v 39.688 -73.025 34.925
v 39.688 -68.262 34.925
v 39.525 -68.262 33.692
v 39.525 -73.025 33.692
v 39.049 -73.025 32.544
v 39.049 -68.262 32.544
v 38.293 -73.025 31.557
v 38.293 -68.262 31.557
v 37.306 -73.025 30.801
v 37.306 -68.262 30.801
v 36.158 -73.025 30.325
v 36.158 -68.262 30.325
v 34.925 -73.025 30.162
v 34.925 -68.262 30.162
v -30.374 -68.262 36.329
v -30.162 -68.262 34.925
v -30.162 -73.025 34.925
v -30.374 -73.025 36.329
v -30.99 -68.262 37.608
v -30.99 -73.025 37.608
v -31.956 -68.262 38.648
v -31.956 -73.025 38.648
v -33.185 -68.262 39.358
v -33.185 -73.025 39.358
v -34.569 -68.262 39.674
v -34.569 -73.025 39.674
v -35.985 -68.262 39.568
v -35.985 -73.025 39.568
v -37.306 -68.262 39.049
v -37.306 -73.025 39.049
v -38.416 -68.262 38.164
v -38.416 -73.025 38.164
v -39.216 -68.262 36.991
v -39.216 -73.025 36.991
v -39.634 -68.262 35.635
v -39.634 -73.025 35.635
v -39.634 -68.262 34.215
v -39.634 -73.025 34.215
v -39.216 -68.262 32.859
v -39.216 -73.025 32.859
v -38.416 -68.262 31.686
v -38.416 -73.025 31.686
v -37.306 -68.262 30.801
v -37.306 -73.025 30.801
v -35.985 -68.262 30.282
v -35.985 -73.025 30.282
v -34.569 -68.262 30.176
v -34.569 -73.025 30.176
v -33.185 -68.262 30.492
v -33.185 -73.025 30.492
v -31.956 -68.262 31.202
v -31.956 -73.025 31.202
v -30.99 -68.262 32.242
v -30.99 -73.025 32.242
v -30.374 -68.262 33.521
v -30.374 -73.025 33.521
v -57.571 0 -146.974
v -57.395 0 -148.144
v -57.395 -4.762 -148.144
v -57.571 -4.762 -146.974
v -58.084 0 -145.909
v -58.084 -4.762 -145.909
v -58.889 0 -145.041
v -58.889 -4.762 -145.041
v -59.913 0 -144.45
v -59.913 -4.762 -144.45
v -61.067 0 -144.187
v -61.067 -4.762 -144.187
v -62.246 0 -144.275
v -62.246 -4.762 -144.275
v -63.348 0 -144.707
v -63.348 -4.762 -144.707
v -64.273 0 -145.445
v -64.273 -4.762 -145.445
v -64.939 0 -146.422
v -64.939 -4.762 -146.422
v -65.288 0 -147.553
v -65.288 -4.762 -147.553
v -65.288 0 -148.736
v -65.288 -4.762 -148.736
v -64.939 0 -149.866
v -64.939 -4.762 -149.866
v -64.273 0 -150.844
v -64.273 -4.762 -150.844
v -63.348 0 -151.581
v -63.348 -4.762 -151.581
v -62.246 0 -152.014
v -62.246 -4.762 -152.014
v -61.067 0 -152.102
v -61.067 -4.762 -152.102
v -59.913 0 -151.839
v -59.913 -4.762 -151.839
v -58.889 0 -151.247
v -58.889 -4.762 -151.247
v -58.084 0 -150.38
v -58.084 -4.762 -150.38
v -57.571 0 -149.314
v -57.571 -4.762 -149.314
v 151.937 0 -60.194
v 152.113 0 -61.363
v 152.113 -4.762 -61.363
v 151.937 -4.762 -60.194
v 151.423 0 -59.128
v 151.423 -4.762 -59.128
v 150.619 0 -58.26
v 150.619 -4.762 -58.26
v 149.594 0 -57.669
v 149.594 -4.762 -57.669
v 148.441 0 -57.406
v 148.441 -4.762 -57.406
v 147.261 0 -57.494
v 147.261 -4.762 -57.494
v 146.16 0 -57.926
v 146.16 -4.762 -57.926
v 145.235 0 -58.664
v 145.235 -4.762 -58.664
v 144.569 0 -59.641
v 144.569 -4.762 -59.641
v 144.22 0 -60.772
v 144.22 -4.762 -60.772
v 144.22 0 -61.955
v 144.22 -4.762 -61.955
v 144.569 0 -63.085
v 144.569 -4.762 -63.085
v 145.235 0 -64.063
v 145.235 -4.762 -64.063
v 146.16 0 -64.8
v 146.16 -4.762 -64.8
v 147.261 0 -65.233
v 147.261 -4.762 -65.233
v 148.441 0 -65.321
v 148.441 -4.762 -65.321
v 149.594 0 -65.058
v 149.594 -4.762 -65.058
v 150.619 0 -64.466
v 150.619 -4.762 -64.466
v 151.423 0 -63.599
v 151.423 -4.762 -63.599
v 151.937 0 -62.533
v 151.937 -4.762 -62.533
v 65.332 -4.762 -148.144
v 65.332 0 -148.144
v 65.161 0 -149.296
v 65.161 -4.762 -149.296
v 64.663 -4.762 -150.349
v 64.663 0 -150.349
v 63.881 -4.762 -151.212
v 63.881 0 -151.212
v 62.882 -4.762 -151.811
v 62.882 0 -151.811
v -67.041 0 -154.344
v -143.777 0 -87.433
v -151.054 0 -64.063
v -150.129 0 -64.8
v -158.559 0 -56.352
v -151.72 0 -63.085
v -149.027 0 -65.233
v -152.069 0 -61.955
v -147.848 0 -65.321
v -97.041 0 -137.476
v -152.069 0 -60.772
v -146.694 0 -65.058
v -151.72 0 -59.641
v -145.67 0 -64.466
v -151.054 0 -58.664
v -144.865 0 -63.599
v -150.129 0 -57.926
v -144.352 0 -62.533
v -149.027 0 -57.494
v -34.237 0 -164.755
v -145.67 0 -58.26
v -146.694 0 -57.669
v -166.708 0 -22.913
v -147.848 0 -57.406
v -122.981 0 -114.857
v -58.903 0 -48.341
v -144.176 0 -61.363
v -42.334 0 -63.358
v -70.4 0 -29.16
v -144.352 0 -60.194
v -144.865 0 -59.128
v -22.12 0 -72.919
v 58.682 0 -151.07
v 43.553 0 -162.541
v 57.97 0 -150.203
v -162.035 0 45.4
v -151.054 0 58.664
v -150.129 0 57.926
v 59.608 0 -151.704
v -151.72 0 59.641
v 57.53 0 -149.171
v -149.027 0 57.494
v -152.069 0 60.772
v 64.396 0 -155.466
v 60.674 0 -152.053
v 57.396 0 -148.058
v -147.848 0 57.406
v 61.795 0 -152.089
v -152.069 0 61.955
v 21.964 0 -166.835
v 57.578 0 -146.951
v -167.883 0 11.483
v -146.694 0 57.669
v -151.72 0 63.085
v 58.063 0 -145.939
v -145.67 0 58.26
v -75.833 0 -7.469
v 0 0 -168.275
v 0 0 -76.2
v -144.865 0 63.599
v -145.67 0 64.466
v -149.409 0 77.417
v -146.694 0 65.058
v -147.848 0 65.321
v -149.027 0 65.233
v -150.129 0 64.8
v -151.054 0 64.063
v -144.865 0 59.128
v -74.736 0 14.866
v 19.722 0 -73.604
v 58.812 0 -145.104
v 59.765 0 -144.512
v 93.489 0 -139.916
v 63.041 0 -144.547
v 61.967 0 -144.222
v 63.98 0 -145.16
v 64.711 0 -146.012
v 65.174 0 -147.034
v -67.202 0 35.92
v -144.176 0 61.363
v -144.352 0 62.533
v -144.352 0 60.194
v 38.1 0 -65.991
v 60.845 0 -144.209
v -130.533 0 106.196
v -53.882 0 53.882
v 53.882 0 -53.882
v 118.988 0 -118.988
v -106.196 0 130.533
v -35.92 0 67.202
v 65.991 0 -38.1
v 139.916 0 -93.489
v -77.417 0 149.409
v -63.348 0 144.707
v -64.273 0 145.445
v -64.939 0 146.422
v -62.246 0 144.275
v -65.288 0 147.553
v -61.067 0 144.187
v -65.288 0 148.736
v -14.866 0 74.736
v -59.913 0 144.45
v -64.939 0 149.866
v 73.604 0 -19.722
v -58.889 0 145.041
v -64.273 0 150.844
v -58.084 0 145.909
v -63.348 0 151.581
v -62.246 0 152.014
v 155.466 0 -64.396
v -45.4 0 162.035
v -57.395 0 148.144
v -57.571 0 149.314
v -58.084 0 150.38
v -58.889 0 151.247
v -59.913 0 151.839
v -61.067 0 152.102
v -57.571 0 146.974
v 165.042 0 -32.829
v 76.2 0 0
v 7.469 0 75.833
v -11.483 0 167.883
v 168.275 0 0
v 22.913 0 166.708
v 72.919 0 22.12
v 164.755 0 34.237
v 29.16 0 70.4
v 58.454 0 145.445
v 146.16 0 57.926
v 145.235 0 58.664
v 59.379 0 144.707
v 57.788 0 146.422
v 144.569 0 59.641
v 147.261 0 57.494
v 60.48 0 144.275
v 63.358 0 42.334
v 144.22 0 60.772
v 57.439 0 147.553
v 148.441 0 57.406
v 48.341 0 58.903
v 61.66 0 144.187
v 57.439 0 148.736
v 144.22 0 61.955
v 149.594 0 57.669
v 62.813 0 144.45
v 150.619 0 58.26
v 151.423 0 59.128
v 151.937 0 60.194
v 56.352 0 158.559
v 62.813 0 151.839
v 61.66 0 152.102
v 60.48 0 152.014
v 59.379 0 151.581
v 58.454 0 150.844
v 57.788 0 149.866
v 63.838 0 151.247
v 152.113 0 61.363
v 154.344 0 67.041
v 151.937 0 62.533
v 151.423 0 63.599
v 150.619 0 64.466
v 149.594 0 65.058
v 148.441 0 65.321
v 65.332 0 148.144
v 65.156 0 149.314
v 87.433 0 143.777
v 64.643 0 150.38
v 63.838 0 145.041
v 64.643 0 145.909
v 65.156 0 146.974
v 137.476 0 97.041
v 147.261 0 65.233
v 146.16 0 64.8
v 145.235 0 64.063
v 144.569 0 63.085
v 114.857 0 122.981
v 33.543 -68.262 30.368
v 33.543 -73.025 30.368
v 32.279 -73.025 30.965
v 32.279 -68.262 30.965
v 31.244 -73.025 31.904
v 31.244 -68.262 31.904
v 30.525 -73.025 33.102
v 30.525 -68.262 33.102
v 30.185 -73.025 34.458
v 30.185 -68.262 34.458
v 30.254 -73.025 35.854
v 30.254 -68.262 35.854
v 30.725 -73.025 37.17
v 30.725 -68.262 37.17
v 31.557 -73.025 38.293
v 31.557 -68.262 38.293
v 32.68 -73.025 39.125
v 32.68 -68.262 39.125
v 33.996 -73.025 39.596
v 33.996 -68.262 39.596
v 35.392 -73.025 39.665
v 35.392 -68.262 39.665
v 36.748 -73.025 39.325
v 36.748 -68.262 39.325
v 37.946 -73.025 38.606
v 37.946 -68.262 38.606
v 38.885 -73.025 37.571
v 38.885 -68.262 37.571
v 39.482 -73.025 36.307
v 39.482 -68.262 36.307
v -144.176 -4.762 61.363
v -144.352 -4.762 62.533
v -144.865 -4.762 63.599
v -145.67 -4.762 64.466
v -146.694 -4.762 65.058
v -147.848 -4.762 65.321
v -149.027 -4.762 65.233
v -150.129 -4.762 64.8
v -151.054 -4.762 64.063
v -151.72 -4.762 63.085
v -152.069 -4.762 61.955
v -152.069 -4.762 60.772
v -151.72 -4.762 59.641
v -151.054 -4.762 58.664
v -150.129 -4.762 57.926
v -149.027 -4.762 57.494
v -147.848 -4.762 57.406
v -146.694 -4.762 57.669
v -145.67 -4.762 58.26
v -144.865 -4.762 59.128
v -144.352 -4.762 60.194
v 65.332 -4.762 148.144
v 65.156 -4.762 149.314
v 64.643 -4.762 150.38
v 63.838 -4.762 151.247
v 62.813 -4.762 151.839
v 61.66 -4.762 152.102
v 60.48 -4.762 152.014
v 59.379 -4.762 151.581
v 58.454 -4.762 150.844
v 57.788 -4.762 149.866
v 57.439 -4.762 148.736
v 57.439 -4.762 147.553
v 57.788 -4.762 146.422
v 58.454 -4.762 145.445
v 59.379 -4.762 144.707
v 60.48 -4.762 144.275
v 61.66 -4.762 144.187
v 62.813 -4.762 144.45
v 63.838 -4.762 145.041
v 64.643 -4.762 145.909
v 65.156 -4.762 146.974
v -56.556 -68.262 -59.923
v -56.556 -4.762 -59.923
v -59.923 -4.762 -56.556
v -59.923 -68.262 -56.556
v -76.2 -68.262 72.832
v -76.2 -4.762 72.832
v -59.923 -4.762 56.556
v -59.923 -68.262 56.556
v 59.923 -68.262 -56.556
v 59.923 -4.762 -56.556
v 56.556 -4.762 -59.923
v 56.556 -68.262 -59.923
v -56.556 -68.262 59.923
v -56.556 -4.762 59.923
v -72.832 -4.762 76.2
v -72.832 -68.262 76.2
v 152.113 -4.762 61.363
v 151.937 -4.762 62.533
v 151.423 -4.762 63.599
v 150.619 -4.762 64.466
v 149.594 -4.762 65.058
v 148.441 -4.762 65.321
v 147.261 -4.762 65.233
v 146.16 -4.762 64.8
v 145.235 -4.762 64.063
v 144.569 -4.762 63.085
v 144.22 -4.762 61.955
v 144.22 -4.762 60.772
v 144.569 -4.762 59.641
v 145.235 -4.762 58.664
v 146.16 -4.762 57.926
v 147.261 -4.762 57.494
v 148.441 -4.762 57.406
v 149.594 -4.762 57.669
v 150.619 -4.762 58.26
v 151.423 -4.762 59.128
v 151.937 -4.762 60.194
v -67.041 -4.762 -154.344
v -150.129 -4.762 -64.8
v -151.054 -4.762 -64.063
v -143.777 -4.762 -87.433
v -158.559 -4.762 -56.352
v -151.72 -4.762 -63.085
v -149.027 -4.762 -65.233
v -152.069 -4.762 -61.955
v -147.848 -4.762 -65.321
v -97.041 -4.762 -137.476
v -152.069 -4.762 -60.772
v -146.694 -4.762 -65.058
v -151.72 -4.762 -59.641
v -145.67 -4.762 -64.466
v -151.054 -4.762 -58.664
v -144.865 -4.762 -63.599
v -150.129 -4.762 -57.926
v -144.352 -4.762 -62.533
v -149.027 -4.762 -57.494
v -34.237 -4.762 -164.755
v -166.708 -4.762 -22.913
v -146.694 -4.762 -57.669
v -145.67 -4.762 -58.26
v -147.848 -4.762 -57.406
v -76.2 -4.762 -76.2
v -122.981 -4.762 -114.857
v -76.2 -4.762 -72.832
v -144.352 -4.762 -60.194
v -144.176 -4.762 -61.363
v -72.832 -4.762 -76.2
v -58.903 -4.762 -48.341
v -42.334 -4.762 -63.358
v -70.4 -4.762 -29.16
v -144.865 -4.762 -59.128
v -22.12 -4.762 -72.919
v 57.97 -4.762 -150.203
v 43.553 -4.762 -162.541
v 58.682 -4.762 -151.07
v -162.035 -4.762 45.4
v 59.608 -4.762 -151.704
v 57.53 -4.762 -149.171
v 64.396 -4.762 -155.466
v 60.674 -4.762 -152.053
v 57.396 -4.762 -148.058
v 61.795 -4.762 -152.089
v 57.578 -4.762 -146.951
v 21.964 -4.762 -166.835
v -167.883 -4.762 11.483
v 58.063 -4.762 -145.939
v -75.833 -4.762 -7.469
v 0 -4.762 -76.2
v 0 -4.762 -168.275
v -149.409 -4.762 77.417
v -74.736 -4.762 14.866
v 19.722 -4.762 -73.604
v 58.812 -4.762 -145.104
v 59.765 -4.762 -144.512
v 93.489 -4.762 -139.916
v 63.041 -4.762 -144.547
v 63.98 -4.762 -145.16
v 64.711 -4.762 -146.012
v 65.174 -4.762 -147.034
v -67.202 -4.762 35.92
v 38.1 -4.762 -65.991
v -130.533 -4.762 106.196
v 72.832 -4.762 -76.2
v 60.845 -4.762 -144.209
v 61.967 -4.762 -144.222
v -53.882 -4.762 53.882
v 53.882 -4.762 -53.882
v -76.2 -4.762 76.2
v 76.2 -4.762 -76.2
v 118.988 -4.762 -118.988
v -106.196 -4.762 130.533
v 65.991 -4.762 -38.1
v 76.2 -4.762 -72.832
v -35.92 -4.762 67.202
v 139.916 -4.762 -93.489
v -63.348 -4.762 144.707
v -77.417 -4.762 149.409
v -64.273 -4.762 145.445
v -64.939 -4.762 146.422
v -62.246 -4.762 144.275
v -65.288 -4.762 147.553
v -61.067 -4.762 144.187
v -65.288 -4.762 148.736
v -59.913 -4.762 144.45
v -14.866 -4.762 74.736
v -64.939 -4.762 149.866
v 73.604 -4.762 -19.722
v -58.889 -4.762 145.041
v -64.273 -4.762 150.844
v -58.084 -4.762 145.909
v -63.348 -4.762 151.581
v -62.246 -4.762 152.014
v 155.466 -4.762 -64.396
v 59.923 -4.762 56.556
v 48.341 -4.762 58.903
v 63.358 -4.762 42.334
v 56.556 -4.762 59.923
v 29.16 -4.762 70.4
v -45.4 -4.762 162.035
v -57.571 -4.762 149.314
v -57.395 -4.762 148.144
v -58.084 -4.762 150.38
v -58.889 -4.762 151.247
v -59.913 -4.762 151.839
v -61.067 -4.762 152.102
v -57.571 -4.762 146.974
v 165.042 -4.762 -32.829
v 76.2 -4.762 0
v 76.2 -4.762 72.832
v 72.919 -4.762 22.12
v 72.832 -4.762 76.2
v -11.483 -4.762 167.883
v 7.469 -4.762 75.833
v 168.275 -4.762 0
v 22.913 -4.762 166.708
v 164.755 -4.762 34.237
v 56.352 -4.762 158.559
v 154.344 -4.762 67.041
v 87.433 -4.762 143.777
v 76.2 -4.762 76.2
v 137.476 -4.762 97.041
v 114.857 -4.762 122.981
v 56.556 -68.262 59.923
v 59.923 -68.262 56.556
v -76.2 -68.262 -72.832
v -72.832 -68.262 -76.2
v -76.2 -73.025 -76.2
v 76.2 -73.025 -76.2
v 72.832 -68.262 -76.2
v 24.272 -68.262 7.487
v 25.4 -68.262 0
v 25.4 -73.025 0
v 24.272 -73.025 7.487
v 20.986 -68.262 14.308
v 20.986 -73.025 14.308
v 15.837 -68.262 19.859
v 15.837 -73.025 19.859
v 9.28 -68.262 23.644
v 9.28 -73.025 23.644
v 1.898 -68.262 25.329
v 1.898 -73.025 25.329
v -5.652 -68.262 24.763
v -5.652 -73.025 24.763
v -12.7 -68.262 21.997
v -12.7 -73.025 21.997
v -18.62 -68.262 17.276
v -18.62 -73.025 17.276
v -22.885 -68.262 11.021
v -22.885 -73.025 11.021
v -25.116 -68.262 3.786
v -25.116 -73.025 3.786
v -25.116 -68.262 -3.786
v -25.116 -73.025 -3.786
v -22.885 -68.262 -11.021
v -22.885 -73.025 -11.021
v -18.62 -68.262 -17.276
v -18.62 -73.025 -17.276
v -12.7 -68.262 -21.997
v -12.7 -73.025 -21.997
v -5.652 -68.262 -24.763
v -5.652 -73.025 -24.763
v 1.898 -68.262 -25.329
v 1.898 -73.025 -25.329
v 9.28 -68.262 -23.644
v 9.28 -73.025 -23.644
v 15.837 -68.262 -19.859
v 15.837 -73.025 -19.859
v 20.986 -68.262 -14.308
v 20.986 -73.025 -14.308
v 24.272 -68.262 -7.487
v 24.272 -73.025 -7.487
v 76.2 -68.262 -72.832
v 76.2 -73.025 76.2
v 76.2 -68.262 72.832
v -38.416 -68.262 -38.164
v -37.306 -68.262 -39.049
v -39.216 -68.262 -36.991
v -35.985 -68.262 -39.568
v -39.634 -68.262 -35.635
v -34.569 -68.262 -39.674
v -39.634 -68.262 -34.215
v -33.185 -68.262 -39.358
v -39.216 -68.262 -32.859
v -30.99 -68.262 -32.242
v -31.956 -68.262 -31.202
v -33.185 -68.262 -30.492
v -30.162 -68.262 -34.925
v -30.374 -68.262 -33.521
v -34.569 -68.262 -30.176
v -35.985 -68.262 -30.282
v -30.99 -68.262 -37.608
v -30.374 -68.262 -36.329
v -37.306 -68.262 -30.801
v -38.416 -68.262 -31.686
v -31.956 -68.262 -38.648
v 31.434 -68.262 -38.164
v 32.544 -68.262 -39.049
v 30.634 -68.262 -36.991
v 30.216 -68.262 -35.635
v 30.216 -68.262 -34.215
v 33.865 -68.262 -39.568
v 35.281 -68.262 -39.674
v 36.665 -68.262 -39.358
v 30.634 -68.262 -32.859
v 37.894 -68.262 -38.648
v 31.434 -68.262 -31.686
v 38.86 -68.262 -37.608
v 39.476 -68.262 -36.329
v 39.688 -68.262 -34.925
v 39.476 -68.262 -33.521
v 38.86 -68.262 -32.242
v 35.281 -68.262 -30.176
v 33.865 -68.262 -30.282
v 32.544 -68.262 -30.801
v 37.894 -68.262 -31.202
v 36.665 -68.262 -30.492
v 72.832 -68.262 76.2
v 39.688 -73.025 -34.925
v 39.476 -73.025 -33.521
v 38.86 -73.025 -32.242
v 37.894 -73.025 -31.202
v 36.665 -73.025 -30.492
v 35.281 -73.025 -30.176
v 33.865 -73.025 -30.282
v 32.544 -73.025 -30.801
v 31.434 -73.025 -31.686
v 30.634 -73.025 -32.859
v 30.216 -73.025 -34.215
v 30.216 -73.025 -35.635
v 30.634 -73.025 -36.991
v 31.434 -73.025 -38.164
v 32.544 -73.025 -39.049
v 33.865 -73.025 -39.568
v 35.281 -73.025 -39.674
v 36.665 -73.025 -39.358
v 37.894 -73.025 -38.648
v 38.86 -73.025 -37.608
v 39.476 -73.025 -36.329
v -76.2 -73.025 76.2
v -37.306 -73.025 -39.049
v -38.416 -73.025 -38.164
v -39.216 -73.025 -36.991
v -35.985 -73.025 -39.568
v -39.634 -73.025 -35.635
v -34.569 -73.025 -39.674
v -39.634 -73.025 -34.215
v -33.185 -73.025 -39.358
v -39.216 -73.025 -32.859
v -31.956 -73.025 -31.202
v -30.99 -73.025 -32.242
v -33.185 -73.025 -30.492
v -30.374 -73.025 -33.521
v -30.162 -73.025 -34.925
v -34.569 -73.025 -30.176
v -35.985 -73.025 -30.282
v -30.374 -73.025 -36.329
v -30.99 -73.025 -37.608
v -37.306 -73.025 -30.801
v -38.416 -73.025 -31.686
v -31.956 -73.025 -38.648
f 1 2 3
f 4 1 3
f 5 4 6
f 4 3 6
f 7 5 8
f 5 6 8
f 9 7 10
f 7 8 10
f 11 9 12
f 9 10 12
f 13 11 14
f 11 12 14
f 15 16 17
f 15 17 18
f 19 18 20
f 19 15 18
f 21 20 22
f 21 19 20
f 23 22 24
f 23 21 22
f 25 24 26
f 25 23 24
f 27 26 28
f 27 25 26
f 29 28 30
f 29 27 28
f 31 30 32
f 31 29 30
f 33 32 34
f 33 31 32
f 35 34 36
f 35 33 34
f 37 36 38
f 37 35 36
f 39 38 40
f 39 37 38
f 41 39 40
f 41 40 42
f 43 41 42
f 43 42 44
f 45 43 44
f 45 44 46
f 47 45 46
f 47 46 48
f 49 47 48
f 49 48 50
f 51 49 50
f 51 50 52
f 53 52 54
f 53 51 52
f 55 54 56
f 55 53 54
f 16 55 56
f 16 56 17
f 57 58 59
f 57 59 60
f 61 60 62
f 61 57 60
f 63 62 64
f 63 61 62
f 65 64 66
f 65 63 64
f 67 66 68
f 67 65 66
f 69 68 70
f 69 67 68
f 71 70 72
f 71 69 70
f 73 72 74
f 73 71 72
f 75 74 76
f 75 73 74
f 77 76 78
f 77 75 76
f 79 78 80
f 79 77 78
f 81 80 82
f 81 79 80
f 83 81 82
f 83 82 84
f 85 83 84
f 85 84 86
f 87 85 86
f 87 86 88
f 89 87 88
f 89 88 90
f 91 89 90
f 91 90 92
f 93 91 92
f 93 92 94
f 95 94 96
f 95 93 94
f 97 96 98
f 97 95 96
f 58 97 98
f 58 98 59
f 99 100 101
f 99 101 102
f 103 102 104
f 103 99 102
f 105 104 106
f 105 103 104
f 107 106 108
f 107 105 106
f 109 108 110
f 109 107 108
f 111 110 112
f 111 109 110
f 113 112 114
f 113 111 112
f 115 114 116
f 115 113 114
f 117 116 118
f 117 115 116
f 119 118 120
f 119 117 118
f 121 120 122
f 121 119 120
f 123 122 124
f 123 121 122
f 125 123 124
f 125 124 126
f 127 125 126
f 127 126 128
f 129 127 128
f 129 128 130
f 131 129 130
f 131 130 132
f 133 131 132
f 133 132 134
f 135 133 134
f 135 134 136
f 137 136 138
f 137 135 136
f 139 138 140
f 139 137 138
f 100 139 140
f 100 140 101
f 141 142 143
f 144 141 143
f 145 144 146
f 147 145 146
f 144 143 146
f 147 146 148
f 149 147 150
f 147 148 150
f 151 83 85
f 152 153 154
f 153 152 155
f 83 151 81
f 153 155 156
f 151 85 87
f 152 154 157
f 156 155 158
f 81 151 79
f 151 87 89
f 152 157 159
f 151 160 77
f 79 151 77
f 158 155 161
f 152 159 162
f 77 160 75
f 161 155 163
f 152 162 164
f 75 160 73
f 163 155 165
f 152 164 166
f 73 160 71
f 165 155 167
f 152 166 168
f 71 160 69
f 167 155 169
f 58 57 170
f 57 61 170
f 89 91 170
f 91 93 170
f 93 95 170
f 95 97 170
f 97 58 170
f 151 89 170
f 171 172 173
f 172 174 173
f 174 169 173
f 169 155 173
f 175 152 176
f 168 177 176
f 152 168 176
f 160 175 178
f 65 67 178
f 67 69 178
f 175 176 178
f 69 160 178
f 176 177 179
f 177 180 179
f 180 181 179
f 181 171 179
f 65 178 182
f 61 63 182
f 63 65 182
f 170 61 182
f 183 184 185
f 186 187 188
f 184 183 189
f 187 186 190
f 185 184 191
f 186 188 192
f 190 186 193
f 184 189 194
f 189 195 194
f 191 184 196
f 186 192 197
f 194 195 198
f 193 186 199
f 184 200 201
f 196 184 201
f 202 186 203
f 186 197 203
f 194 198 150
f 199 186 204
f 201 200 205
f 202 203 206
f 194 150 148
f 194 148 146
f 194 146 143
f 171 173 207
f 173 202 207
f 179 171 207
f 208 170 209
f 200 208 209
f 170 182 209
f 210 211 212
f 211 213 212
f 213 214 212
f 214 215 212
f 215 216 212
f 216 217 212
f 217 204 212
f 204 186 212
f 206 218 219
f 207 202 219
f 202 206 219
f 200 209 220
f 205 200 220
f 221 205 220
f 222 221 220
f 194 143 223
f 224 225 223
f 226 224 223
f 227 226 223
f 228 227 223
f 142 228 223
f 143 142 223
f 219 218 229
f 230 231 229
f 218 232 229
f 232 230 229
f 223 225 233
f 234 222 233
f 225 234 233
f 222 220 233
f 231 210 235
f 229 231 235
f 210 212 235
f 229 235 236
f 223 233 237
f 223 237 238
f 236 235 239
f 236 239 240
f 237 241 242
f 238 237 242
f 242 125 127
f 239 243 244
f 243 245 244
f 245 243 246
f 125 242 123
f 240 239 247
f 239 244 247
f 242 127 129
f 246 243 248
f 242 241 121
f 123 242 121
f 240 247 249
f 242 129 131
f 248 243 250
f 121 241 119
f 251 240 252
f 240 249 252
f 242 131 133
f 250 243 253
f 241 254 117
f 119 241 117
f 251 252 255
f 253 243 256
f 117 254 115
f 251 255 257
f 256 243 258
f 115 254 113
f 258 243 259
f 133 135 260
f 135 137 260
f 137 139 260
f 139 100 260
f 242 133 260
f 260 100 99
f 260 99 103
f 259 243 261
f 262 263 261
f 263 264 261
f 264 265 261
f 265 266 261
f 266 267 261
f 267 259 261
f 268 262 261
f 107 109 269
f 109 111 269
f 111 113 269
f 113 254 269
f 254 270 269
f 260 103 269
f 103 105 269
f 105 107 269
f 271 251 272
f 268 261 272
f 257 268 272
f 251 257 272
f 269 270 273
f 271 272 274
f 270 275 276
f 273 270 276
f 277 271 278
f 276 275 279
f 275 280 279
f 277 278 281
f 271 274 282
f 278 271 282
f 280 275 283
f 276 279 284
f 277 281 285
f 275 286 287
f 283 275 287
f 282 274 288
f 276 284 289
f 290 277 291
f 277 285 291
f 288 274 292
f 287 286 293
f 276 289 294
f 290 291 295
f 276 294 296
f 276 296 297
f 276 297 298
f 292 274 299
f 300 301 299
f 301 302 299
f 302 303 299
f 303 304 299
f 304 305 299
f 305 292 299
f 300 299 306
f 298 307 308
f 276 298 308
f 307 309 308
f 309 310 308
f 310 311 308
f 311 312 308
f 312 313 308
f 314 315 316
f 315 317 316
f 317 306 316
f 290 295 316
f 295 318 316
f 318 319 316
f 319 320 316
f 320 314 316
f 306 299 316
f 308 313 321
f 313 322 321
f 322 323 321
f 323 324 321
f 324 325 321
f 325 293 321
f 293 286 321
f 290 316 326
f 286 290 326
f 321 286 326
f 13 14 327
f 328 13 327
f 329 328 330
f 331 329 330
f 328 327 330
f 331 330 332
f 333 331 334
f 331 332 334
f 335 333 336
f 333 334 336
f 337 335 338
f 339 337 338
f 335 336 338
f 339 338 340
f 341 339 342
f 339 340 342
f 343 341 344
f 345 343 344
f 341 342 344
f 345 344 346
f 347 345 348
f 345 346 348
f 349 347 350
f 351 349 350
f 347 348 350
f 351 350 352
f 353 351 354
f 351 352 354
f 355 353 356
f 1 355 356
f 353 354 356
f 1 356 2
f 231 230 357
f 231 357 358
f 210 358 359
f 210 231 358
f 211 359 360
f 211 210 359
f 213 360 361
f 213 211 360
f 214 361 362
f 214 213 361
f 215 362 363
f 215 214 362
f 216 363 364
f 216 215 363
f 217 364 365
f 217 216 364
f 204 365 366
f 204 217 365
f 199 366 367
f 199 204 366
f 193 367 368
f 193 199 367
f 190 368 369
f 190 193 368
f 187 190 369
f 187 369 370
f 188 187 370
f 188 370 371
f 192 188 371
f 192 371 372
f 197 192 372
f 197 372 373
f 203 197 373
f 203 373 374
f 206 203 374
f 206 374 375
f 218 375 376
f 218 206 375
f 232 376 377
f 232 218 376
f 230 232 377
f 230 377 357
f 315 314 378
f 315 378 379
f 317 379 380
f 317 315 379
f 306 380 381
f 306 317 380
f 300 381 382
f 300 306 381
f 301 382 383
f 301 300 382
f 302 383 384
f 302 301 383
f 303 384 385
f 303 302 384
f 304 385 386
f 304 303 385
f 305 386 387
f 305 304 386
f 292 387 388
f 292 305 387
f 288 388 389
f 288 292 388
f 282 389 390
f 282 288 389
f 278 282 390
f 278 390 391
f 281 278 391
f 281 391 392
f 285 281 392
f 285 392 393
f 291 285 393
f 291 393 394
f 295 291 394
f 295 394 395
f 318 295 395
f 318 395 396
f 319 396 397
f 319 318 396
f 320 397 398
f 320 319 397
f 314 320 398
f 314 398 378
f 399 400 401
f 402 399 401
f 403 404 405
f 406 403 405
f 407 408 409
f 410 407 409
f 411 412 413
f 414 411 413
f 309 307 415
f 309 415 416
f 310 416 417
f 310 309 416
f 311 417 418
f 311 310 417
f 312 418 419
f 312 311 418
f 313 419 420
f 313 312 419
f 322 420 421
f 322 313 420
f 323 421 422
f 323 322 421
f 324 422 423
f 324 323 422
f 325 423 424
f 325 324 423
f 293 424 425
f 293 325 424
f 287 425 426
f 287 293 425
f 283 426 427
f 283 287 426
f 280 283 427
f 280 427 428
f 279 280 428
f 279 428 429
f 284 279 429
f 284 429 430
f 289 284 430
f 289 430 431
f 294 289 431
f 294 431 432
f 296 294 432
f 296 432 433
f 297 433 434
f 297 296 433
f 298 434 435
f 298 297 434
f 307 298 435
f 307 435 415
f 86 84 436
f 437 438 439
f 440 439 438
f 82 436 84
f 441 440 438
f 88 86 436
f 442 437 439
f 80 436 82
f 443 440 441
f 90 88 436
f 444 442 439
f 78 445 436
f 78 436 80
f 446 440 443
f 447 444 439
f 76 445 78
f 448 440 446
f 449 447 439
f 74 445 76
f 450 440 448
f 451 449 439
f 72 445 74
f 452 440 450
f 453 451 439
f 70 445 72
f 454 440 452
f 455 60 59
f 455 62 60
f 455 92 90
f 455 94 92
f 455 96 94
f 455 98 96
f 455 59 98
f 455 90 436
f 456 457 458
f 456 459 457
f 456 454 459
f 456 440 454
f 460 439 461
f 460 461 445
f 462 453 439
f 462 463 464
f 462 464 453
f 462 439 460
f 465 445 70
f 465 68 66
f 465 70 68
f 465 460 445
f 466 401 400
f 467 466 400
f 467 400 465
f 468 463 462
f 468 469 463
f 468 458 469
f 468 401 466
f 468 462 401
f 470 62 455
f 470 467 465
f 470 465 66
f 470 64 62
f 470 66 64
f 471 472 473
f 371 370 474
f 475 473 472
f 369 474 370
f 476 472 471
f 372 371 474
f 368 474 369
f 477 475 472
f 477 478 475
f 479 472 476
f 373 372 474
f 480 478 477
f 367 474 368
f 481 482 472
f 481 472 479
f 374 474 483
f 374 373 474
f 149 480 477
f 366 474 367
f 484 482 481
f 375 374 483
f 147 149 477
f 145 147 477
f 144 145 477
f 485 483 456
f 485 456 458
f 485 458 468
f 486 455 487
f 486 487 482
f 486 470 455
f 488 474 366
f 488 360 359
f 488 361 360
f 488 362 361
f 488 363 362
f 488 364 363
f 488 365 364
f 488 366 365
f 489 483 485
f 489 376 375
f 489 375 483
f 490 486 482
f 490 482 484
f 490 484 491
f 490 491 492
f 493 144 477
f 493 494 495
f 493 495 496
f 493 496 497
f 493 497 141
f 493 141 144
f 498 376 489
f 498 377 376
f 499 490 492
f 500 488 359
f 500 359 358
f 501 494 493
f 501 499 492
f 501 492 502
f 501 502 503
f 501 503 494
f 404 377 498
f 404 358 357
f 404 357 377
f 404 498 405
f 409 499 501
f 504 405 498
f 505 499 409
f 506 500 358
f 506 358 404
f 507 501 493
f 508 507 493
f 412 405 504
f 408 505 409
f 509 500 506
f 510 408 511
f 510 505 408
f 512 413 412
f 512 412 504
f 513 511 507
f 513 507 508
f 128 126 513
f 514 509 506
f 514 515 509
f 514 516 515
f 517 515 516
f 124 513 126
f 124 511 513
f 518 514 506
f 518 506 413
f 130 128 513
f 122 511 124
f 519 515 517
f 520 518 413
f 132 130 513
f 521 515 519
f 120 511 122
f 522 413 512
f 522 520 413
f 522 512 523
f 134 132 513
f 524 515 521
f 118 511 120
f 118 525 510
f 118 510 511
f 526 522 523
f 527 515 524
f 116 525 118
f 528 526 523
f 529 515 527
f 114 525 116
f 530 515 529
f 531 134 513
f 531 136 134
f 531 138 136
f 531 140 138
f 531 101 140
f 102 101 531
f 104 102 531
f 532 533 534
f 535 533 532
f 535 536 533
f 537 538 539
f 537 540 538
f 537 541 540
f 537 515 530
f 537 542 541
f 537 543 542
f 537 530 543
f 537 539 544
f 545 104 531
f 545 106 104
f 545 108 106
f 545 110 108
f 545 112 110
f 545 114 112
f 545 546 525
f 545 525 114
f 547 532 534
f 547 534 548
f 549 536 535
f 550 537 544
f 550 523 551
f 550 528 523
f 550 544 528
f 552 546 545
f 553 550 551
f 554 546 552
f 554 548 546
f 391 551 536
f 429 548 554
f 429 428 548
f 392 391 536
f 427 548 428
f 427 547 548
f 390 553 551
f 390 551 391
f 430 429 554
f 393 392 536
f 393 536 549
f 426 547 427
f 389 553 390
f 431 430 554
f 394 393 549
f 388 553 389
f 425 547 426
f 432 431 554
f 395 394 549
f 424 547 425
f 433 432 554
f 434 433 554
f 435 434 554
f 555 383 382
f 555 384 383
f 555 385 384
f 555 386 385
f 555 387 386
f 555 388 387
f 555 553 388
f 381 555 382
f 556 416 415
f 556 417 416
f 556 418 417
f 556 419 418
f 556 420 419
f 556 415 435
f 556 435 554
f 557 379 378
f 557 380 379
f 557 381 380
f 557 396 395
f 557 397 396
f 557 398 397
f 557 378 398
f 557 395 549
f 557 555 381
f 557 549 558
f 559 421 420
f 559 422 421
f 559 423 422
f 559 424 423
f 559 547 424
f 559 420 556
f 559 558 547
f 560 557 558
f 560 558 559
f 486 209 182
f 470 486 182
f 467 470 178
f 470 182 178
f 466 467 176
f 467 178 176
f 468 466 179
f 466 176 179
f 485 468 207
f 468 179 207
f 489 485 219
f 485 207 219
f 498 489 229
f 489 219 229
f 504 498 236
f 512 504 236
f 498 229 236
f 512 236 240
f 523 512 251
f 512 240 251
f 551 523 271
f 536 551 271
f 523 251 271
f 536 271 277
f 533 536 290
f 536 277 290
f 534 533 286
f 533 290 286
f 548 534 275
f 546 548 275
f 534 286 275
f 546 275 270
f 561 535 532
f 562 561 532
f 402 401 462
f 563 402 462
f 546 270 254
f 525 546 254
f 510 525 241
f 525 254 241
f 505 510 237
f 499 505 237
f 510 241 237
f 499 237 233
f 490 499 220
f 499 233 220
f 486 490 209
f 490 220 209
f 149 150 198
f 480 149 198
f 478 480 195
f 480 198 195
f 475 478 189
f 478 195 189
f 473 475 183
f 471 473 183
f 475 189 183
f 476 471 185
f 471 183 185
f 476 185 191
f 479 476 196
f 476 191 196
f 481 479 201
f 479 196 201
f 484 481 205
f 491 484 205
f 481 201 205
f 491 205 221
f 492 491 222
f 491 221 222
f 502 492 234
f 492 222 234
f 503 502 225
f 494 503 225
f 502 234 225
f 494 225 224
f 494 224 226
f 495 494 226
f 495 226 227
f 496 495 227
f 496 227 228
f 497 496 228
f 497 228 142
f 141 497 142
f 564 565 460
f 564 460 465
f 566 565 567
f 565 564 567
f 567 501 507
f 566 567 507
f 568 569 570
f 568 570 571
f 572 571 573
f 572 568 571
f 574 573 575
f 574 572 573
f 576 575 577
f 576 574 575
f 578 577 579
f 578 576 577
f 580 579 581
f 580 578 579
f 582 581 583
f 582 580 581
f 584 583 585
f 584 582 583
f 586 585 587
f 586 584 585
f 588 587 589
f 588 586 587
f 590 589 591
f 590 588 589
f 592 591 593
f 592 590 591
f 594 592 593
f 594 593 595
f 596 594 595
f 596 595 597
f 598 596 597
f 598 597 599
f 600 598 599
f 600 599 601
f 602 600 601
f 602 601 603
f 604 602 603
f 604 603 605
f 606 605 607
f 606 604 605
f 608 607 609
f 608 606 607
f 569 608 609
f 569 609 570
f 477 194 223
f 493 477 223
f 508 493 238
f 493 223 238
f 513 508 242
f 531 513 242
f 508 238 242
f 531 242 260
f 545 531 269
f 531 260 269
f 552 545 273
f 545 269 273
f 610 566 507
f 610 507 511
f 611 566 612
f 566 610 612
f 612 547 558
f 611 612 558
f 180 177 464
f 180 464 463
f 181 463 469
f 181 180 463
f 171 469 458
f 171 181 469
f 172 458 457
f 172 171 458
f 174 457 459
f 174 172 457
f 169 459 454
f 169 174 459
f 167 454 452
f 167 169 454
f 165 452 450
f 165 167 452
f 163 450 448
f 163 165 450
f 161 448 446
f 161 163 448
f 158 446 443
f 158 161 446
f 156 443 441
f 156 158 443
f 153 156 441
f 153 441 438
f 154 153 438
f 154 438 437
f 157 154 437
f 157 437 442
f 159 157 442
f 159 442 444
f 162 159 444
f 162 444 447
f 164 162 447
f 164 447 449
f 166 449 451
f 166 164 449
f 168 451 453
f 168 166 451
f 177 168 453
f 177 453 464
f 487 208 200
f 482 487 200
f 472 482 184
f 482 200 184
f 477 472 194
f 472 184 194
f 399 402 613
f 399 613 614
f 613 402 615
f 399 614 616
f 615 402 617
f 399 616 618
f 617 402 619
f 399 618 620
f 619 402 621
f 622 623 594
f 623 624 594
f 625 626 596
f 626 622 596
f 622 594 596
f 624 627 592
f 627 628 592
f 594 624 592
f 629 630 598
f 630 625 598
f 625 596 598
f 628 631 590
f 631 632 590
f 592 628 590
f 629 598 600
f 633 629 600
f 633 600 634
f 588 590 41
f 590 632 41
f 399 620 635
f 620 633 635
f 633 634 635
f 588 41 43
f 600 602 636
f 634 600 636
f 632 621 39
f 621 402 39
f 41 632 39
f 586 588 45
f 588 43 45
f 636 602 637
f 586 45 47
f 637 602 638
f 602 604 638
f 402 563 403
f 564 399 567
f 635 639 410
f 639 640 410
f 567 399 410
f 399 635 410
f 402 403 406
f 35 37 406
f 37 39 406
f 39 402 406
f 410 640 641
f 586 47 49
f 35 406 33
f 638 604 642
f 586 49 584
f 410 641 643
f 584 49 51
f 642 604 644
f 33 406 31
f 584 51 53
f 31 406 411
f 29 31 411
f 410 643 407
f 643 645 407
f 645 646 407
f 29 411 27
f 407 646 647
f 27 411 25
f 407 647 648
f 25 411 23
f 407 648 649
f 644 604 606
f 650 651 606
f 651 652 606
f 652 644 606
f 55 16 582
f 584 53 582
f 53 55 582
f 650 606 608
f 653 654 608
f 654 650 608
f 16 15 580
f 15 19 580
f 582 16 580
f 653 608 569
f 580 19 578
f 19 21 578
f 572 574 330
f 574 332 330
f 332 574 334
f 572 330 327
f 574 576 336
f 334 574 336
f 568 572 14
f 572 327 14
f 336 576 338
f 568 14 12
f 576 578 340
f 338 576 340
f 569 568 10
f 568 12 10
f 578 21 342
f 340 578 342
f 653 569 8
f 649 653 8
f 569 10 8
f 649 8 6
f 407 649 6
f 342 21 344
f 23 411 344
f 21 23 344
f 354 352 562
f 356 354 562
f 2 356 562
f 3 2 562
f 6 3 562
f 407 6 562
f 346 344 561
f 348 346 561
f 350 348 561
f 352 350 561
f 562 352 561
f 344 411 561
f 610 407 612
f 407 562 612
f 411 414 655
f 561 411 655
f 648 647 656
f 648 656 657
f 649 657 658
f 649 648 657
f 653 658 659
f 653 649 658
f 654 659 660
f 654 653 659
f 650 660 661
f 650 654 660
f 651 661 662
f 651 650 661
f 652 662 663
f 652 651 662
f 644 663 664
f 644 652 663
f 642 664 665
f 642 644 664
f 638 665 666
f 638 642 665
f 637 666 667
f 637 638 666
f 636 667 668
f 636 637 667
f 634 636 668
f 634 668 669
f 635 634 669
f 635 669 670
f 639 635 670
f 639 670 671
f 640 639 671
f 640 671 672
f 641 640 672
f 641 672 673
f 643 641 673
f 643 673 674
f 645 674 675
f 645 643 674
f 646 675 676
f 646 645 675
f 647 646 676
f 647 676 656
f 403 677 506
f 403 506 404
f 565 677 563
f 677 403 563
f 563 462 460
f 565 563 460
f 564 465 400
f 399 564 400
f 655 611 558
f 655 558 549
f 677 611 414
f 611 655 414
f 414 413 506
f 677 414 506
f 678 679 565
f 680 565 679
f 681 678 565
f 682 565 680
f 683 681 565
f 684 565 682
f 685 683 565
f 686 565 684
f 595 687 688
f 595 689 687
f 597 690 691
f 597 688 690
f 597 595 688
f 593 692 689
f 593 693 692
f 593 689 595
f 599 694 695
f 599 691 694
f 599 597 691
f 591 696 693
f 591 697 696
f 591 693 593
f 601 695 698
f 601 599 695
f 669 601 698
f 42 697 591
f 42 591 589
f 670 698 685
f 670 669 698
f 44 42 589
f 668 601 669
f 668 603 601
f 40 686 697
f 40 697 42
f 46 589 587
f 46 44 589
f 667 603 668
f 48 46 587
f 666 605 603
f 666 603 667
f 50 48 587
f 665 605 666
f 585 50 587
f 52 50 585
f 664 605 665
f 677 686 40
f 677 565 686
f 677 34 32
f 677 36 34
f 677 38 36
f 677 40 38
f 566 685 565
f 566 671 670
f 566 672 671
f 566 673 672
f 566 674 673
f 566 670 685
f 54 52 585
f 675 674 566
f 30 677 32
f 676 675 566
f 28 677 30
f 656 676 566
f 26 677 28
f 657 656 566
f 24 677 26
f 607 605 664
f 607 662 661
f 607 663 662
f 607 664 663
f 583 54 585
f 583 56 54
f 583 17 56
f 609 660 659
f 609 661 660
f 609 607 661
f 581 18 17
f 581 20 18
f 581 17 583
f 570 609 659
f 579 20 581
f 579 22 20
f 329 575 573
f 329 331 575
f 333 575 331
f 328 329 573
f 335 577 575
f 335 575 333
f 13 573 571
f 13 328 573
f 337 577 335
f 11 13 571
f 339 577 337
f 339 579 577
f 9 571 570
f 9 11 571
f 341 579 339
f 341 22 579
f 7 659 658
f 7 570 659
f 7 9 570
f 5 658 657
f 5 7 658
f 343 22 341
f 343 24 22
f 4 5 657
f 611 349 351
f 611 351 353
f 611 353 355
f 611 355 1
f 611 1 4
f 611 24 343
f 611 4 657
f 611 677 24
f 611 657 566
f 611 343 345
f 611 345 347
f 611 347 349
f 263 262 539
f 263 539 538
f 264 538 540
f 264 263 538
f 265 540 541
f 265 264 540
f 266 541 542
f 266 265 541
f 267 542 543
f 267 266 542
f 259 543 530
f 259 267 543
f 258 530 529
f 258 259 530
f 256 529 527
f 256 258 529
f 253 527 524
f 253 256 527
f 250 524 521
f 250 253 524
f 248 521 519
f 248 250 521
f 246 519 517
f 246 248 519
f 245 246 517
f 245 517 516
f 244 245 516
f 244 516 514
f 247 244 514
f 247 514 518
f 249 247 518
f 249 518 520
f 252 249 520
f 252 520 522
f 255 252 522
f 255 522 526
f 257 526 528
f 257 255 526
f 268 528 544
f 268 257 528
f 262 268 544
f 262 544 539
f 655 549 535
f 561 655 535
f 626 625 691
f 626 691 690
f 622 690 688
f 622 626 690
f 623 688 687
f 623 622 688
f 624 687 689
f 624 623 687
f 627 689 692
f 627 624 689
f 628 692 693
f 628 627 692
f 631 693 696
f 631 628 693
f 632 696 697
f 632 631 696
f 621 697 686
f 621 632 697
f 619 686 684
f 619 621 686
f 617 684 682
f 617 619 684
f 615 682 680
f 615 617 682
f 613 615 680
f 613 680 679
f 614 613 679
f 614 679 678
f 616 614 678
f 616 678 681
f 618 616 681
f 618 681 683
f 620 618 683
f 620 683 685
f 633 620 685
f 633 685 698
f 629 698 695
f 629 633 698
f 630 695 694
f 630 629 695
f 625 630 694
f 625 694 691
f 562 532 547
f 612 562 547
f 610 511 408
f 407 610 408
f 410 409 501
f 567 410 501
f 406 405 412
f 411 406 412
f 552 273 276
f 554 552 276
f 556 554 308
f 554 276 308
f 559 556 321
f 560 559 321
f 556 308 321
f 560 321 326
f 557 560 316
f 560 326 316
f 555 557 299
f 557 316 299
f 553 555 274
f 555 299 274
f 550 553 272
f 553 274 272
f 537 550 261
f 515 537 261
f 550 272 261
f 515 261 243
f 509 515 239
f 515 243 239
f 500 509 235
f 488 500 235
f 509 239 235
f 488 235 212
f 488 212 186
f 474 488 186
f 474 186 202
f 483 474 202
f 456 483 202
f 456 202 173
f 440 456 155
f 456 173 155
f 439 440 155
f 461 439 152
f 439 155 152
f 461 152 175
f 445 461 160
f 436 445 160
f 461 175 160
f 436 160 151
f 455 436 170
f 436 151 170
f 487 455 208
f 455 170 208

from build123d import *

# Parameters (mm, degrees)
F0_R     = 3.96875
F1_DEPTH = 4.7625
F3_DEPTH = 63.5
F4_R     = 4.7625
F4_R_2   = 25.4
F5_DEPTH = 4.7625


with BuildPart() as f1:
    # F0 (on Front) → F1 (new body)
    with BuildSketch(Plane.XZ):
        with BuildLine():
            ThreePointArc((168.275, 0), (-118.988394, 118.988394), (0, -168.275))
            ThreePointArc((0, -168.275), (32.828824, -165.041643), (64.396055, -155.465828))
            ThreePointArc((64.396055, -155.465828), (139.915549, -93.488581), (168.275, 0))
        make_face()
        with Locations((-61.363365, -148.144268)):
            Circle(F0_R, mode=Mode.SUBTRACT)
        with Locations((-148.144268, -61.363365)):
            Circle(F0_R, mode=Mode.SUBTRACT)
        with BuildLine():
            ThreePointArc((65.332115, -148.144268), (64.66326, -150.349187), (62.88214, -151.810915))
            ThreePointArc((62.88214, -151.810915), (58.06347, -145.939348), (65.332115, -148.144268))
        make_face(mode=Mode.SUBTRACT)
        with Locations((148.144268, -61.363365)):
            Circle(F0_R, mode=Mode.SUBTRACT)
        with Locations((-148.144268, 61.363365)):
            Circle(F0_R, mode=Mode.SUBTRACT)
        with Locations((-61.363365, 148.144268)):
            Circle(F0_R, mode=Mode.SUBTRACT)
        with BuildLine():
            ThreePointArc((152.4, 0), (107.763073, -107.763073), (0, -152.4))
            ThreePointArc((0, -152.4), (-107.763073, 107.763073), (152.4, 0))
        make_face(mode=Mode.SUBTRACT)
        with Locations((148.144268, 61.363365)):
            Circle(F0_R, mode=Mode.SUBTRACT)
        with Locations((61.363365, 148.144268)):
            Circle(F0_R, mode=Mode.SUBTRACT)
        with BuildLine():
            ThreePointArc((152.4, 0), (-107.763073, 107.763073), (0, -152.4))
            ThreePointArc((0, -152.4), (107.763073, -107.763073), (152.4, 0))
        make_face()
        with BuildLine():
            ThreePointArc((0, -76.2), (-53.881537, 53.881537), (76.2, 0))
            ThreePointArc((76.2, 0), (53.881537, -53.881537), (0, -76.2))
        make_face(mode=Mode.SUBTRACT)
    extrude(amount=F1_DEPTH)

    # F2 (on face) → F3 (join)
    with BuildSketch(Plane.XZ.offset(4.7625)):
        Polygon((-56.55569, 59.923286), (-72.832404, 76.2), (-76.2, 76.2), (-76.2, 72.832404), (-59.923286, 56.55569), (-58.239488, 58.239488), align=None)
        Polygon((59.923286, 56.55569), (76.2, 72.832404), (76.2, 76.2), (72.832404, 76.2), (56.55569, 59.923286), (58.239488, 58.239488), align=None)
        Polygon((76.2, -76.2), (76.2, -72.832404), (59.923286, -56.55569), (58.239488, -58.239488), (56.55569, -59.923286), (72.832404, -76.2), align=None)
        Polygon((-76.2, -76.2), (-72.832404, -76.2), (-56.55569, -59.923286), (-58.239488, -58.239488), (-59.923286, -56.55569), (-76.2, -72.832404), align=None)
    extrude(amount=F3_DEPTH)

    # F4 (on face) → F5 (join)
    with BuildSketch(Plane.XZ.offset(68.2625)):
        Polygon((-72.832404, 76.2), (-76.2, 76.2), (-76.2, -76.2), (76.2, -76.2), (76.2, 76.2), align=None)
        with Locations((-34.925, -34.925)):
            Circle(F4_R, mode=Mode.SUBTRACT)
        with Locations((34.925, -34.925)):
            Circle(F4_R, mode=Mode.SUBTRACT)
        with Locations((-34.925, 34.925)):
            Circle(F4_R, mode=Mode.SUBTRACT)
        Circle(F4_R_2, mode=Mode.SUBTRACT)
        with BuildLine():
            ThreePointArc((39.6875, 34.925), (38.292596, 31.557404), (34.925, 30.1625))
            ThreePointArc((34.925, 30.1625), (31.557404, 38.292596), (39.6875, 34.925))
        make_face(mode=Mode.SUBTRACT)
    extrude(amount=F5_DEPTH)


solid = f1.part
